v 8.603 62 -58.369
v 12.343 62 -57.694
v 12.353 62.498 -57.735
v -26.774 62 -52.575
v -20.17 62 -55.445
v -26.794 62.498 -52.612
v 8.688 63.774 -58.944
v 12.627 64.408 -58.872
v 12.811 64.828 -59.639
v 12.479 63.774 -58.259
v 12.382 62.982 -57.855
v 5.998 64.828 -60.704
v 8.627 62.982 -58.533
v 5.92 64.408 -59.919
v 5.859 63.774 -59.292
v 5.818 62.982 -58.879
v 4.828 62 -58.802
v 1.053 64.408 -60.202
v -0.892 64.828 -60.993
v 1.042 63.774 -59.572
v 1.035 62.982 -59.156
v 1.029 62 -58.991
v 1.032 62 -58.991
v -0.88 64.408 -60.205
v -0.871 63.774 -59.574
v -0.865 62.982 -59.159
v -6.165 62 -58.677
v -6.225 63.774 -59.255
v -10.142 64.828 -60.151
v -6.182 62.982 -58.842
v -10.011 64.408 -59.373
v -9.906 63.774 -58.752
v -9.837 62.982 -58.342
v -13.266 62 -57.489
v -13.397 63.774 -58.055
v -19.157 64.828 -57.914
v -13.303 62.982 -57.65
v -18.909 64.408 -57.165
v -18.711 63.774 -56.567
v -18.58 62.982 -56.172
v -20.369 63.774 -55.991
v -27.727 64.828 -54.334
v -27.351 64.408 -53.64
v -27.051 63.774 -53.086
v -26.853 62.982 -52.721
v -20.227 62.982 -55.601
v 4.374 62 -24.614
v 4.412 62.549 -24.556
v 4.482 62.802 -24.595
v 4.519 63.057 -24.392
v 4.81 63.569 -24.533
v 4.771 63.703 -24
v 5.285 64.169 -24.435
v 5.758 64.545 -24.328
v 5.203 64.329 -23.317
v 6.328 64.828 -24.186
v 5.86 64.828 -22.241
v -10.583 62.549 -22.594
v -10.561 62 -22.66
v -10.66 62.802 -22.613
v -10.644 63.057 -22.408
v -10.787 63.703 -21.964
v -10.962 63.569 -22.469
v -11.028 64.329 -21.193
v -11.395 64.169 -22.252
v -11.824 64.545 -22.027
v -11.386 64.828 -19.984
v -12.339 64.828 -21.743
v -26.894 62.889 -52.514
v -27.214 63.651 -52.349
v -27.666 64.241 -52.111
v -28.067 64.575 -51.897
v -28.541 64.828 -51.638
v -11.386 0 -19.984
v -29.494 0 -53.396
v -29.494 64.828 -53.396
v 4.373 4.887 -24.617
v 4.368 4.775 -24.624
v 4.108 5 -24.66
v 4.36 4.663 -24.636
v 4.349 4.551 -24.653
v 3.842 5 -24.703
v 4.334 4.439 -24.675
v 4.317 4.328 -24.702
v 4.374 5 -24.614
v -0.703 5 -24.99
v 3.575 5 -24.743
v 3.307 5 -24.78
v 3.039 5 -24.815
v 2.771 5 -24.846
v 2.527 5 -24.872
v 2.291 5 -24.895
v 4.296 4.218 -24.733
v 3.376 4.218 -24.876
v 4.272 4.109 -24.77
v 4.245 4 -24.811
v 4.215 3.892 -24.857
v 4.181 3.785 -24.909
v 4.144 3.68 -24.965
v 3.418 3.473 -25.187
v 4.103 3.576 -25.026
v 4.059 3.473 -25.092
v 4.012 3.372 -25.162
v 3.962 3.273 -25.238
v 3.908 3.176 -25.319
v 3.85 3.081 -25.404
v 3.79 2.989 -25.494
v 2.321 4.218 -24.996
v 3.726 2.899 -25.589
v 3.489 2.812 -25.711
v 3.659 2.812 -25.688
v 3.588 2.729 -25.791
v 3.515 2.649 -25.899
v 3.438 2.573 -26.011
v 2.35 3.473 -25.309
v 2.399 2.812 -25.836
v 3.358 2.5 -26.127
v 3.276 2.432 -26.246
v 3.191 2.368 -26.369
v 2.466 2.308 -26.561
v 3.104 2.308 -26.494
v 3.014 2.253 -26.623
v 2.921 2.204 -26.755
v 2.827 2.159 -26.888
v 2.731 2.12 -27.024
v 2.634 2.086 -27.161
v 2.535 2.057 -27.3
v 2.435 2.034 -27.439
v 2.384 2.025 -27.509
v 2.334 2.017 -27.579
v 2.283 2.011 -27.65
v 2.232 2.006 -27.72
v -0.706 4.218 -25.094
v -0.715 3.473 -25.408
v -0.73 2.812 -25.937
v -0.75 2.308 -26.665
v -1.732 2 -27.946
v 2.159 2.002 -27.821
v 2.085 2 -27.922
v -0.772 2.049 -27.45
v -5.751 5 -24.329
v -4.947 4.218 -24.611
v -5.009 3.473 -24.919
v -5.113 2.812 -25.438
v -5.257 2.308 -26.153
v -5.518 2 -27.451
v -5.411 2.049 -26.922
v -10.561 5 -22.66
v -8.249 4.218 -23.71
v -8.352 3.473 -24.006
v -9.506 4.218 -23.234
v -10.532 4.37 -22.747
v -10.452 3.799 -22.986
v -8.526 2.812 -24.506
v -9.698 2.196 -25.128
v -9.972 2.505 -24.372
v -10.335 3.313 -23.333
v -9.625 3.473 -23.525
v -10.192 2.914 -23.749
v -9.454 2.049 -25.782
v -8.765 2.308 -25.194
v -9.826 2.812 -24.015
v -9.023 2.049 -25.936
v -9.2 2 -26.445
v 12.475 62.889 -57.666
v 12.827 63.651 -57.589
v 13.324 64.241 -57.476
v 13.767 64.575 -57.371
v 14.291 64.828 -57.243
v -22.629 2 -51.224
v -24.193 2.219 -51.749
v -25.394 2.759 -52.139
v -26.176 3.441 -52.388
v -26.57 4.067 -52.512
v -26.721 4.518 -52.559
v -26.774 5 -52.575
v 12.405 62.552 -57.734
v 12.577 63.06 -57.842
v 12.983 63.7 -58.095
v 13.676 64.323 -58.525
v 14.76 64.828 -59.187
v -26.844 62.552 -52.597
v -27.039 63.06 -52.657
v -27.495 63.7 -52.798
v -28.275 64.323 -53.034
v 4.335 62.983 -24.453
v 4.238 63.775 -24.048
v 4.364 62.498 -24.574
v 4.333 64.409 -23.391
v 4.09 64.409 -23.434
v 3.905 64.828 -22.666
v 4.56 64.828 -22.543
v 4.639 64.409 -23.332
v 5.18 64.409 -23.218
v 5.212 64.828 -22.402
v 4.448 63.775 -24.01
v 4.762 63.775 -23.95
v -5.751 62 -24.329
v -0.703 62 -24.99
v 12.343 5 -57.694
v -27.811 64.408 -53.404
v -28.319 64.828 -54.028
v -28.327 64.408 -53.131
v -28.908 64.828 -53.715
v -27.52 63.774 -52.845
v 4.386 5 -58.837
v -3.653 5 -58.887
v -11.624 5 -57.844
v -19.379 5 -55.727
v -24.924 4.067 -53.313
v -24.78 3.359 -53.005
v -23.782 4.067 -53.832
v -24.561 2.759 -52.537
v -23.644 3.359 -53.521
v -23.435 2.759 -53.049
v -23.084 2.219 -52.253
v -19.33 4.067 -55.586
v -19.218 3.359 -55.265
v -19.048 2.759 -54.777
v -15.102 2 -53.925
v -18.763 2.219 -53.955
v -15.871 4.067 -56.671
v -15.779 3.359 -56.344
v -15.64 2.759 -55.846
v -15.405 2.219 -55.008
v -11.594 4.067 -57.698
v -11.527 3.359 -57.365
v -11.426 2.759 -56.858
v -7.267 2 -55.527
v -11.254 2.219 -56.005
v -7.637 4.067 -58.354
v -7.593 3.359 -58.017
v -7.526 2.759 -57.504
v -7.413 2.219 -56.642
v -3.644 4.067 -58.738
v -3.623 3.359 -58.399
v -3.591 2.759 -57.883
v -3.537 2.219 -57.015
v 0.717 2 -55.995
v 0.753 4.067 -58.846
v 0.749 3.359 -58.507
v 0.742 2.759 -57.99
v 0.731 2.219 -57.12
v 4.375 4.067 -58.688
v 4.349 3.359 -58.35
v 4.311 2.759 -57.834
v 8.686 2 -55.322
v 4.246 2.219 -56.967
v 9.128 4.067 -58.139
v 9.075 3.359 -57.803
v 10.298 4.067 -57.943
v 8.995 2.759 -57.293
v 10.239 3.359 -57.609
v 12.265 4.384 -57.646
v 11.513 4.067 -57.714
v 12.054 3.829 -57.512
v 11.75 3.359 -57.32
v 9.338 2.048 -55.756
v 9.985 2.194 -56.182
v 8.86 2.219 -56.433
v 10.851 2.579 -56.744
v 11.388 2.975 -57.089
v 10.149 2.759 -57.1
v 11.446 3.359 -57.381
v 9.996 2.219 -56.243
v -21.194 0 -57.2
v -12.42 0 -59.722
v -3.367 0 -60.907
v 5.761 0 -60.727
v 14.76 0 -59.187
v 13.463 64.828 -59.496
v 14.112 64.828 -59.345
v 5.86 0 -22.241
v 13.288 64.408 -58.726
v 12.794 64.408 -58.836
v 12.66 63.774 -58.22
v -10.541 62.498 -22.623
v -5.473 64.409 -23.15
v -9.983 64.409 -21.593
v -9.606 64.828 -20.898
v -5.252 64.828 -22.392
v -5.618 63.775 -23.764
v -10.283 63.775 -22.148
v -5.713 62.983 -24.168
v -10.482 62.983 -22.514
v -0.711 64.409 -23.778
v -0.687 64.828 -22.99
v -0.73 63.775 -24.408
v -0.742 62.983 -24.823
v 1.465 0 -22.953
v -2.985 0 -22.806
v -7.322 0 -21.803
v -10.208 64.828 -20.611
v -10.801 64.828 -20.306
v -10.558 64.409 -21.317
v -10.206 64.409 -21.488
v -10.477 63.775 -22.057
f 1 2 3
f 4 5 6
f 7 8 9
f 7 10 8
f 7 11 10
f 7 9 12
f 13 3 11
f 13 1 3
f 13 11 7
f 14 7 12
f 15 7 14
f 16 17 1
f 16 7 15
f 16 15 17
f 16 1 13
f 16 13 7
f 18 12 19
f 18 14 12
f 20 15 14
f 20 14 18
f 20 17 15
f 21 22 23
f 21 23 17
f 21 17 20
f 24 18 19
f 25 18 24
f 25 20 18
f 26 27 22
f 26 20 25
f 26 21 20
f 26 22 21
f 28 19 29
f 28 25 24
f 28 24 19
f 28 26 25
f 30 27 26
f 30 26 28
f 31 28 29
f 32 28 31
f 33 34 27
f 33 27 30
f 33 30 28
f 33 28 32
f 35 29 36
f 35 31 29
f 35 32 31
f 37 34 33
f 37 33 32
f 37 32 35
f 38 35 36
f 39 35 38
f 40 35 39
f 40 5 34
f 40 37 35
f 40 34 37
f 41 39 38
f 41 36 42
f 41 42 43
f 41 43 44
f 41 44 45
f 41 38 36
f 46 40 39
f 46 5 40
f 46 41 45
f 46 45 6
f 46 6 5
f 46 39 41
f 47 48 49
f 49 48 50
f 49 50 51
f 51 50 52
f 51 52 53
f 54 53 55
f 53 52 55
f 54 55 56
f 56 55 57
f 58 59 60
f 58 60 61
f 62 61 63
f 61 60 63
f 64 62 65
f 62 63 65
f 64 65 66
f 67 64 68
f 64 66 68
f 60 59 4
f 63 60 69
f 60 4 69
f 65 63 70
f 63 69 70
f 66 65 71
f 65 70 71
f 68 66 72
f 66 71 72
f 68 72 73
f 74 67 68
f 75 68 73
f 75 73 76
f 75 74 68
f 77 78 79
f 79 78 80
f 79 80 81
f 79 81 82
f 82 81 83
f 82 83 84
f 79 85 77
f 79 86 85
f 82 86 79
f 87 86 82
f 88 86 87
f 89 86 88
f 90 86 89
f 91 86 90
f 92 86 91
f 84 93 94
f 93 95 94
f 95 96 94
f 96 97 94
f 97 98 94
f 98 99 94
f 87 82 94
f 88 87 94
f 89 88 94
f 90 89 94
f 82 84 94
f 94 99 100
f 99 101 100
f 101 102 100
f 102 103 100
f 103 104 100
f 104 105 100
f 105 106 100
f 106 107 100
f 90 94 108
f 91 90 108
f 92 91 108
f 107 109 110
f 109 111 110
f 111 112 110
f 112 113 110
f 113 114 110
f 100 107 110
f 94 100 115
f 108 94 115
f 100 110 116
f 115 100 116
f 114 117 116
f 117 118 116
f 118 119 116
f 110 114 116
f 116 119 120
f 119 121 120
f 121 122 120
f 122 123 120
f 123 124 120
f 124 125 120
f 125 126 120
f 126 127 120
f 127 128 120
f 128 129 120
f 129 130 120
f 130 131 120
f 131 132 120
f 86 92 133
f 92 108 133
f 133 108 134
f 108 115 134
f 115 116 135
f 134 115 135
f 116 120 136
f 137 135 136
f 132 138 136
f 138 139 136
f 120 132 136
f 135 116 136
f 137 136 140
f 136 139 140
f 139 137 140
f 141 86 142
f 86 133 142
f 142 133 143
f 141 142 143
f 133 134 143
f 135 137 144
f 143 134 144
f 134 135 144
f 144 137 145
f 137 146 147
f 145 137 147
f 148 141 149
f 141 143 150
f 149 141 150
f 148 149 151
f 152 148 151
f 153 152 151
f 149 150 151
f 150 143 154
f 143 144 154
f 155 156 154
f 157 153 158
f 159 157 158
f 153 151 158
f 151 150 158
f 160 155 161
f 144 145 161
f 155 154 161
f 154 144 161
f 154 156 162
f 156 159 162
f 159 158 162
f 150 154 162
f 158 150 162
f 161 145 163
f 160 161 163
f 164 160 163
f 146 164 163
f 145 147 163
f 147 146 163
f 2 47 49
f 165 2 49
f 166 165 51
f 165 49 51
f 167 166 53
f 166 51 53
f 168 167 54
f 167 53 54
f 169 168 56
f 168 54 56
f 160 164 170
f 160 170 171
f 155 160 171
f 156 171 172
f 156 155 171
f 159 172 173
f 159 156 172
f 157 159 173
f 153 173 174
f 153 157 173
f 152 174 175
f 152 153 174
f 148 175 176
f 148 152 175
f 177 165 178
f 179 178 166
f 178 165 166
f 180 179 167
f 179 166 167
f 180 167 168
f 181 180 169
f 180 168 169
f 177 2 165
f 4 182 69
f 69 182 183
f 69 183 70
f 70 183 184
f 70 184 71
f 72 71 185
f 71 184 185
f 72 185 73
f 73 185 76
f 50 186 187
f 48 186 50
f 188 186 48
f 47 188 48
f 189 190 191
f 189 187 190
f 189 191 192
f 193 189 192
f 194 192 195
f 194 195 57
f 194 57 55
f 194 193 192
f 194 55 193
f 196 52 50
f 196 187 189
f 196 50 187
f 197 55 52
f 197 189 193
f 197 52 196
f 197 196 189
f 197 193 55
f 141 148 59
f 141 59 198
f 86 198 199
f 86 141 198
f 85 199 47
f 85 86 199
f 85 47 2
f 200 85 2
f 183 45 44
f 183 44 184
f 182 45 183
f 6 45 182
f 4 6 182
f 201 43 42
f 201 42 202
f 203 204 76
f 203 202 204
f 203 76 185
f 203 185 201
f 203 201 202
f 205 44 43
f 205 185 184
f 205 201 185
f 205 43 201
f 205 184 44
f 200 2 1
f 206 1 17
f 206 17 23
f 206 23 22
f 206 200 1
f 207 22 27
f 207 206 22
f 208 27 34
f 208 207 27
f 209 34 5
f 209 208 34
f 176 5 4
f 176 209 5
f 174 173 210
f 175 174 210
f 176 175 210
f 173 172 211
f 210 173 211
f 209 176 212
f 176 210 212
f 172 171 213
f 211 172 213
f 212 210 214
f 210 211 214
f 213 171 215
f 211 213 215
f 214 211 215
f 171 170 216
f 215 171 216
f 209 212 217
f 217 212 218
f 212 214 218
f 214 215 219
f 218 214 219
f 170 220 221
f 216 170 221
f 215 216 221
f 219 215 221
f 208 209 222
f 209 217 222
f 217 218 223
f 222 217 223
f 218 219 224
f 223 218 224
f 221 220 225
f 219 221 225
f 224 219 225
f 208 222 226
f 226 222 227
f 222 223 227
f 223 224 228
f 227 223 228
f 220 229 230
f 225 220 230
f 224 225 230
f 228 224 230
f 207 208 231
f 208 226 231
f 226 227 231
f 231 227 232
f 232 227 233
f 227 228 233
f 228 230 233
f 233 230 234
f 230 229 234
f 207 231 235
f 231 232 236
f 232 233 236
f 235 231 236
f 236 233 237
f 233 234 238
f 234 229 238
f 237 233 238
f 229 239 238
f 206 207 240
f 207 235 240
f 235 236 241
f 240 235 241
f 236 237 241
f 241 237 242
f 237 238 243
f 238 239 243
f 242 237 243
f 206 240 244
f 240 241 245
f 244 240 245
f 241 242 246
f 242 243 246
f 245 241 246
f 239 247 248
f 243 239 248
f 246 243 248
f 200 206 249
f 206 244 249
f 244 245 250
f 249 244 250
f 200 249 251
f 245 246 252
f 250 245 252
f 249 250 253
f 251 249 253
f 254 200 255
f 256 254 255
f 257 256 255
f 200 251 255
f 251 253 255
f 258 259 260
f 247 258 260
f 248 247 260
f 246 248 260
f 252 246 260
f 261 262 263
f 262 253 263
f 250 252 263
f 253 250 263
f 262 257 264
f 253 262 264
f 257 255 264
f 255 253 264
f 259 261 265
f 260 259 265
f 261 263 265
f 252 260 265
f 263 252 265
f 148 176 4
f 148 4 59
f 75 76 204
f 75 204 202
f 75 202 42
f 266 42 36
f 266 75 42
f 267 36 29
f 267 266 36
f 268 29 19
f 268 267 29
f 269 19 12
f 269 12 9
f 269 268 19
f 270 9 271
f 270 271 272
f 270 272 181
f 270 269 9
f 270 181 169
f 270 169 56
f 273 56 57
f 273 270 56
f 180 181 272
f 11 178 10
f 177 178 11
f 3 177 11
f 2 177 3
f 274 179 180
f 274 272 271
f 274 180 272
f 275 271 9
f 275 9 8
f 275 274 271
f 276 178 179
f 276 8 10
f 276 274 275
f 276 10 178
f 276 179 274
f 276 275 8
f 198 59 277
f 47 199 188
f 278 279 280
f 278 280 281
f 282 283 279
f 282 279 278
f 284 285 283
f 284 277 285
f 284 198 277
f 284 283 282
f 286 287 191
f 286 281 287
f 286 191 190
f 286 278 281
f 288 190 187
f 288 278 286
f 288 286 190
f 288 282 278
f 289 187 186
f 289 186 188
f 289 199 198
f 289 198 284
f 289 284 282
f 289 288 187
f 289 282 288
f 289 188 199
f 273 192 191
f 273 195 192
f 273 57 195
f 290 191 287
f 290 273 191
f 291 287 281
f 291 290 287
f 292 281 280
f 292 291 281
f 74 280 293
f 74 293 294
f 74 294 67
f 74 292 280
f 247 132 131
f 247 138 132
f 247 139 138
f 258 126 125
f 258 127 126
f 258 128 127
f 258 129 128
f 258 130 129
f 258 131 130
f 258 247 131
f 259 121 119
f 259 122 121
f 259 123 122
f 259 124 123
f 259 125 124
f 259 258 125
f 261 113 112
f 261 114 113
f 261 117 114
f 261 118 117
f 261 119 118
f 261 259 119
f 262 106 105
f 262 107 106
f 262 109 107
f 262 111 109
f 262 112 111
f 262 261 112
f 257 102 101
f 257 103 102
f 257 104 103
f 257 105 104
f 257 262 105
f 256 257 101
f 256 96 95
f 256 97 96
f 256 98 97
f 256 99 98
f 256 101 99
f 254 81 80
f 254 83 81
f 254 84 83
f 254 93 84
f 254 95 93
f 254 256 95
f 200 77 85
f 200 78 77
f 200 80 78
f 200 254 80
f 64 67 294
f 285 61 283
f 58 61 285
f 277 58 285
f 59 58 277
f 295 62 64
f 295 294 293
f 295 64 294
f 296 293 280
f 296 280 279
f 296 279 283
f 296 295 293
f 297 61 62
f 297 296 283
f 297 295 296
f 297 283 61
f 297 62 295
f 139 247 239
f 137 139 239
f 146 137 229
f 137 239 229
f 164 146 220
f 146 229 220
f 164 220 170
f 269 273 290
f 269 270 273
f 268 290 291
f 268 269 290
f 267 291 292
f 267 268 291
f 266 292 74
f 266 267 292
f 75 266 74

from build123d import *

# Parameters (mm, degrees)
BOSS_EXTRUDE1_DEPTH = 2
BOSS_EXTRUDE2_DEPTH = 65
FILLET1_R           = 3


with BuildPart() as part:
    # Sketch1 → Boss-Extrude1 (new body)
    with BuildSketch(Plane(origin=(0, 0, 0), x_dir=(1, 0, 0), z_dir=(0, 1, 0))):
        with BuildLine():
            Line((-10.560958787, 22.659791471), (-26.773952234, 52.575236393))
            ThreePointArc((-26.773952234, 52.575236393), (-7.656070137, 58.501150331), (12.342908564, 57.69447641))
            Line((12.342908564, 57.69447641), (4.374170949, 24.614358178))
            ThreePointArc((4.374170949, 24.614358178), (-3.244097516, 24.788623022), (-10.560958787, 22.659791471))
        make_face()
    extrude(amount=BOSS_EXTRUDE1_DEPTH)

    # Sketch1<3> → Boss-Extrude2 (add)
    with BuildSketch(Plane(origin=(0, 0, 0), x_dir=(1, 0, 0), z_dir=(0, 1, 0))):
        with BuildLine():
            ThreePointArc((5.859670357, 22.24104906), (-2.984569714, 22.80553318), (-11.385698648, 19.984140369))
            Line((-11.385698648, 19.984140369), (-29.493588104, 53.395957344))
            ThreePointArc((-29.493588104, 53.395957344), (-7.915597938, 60.484240173), (14.75975536, 59.187411007))
            Line((14.75975536, 59.187411007), (5.859670357, 22.24104906))
        make_face()
        with BuildLine():
            Line((4.374170949, 24.614358178), (12.342908564, 57.69447641))
            ThreePointArc((12.342908564, 57.69447641), (-7.656070137, 58.501150331), (-26.773952234, 52.575236393))
            Line((-26.773952234, 52.575236393), (-10.560958787, 22.659791471))
            ThreePointArc((-10.560958787, 22.659791471), (-3.244097516, 24.788623022), (4.374170949, 24.614358178))
        make_face(mode=Mode.SUBTRACT)
    extrude(amount=BOSS_EXTRUDE2_DEPTH)

    # Fillet1
    # the kernel refuses this fillet: 3 mm, written as the material it adds along each edge
    with BuildSketch(Plane(origin=(-6.987336603, 2, -16.065913667), x_dir=(0, 1, 0), z_dir=(-0.4764829578611926, 0, -0.879183707121469))) as fillet1_piece_1_section:
        with BuildLine():
            CenterArc((FILLET1_R, FILLET1_R), FILLET1_R, 180, 90)
            Line((0, FILLET1_R), (0, 0))
            Line((0, 0), (FILLET1_R, 0))
        make_face()
    fillet1_piece_1 = extrude(amount=49.02638684, mode=Mode.PRIVATE)
    fillet1_piece_1 = fillet1_piece_1 & Plane(origin=(0, 2, 0), x_dir=(0.20920184006511774, 0, -0.977872481519635), z_dir=(0, -1, 0)) * Cylinder(59, 111, mode=Mode.PRIVATE)
    fillet1_piece_1 = fillet1_piece_1 - Plane(origin=(0, 2, 0), x_dir=(-0.4224383514814905, 0, -0.9063916588305525), z_dir=(0, -1, 0)) * Cylinder(25, 111, mode=Mode.PRIVATE)
    add(fillet1_piece_1)
    with BuildSketch(Plane(origin=(0, 2, 0), x_dir=(0.4581300705855368, 0, -0.8888851660508748), z_dir=(0.8888851660508748, 0, 0.4581300705855368))) as fillet1_piece_2_section:
        with BuildLine():
            CenterArc((25 + FILLET1_R, FILLET1_R), FILLET1_R, 180, 90)
            Line((25 + FILLET1_R, 0), (25, 0))
            Line((25, 0), (25, FILLET1_R))
        make_face()
    fillet1_piece_2 = revolve(axis=Axis((0, 2, 0), (0, 1, 0)), revolution_arc=69.444918607, mode=Mode.PRIVATE)
    fillet1_piece_2 = split(fillet1_piece_2, bisect_by=Plane(origin=(-1.469933591, 2, -0.354095322), z_dir=(-0.9721901531046743, 0, -0.23419288248431033)), keep=Keep.TOP, mode=Mode.PRIVATE)
    fillet1_piece_2 = split(fillet1_piece_2, bisect_by=Plane(origin=(1.329309559, 2, -0.720433449), z_dir=(0.879183707121469, 0, -0.4764829578611926)), keep=Keep.TOP, mode=Mode.PRIVATE)
    add(fillet1_piece_2)
    with BuildSketch(Plane(origin=(14.099355182, 2, -64.985902558), x_dir=(0, 1, 0), z_dir=(-0.23419288248431033, 0, 0.9721901531046743))) as fillet1_piece_3_section:
        with BuildLine():
            CenterArc((FILLET1_R, FILLET1_R), FILLET1_R, 180, 90)
            Line((0, FILLET1_R), (0, 0))
            Line((0, 0), (FILLET1_R, 0))
        make_face()
    fillet1_piece_3 = extrude(amount=49.02638684, mode=Mode.PRIVATE)
    fillet1_piece_3 = fillet1_piece_3 & Plane(origin=(0, 2, 0), x_dir=(0.20920184006511774, 0, -0.977872481519635), z_dir=(0, -1, 0)) * Cylinder(59, 111, mode=Mode.PRIVATE)
    fillet1_piece_3 = fillet1_piece_3 - Plane(origin=(0, 2, 0), x_dir=(-0.4224383514814905, 0, -0.9063916588305525), z_dir=(0, -1, 0)) * Cylinder(25, 111, mode=Mode.PRIVATE)
    add(fillet1_piece_3)
    with BuildSketch(Plane(origin=(0, 2, 0), x_dir=(-0.5631135264188442, 0, -0.8263795474018787), z_dir=(-0.8263795474018787, 0, 0.5631135264188442))) as fillet1_piece_4_section:
        with BuildLine():
            CenterArc((59 - FILLET1_R, -FILLET1_R), FILLET1_R, 0, 90)
            Line((59 - FILLET1_R, 0), (59, 0))
            Line((59, 0), (59, -FILLET1_R))
        make_face()
    fillet1_piece_4 = revolve(axis=Axis((0, 2, 0), (0, -1, 0)), revolution_arc=53.630888503, mode=Mode.PRIVATE)
    fillet1_piece_4 = split(fillet1_piece_4, bisect_by=Plane(origin=(-1.469933591, 2, -0.354095322), z_dir=(-0.9721901531046743, 0, -0.23419288248431033)), keep=Keep.TOP, mode=Mode.PRIVATE)
    fillet1_piece_4 = split(fillet1_piece_4, bisect_by=Plane(origin=(1.329309559, 2, -0.720433449), z_dir=(0.879183707121469, 0, -0.4764829578611926)), keep=Keep.TOP, mode=Mode.PRIVATE)
    add(fillet1_piece_4)
    # the kernel refuses this fillet: 3 mm, written as the material it takes off along each edge
    with BuildSketch(Plane(origin=(0, 65, 0), x_dir=(-0.6714413755332248, 0, -0.7410576760428644), z_dir=(-0.7410576760428644, 0, 0.6714413755332248))) as fillet1_2_piece_1_section:
        with BuildLine():
            CenterArc((25 - FILLET1_R, FILLET1_R), FILLET1_R, 270, 90)
            Line((25, FILLET1_R), (25, 0))
            Line((25, 0), (25 - FILLET1_R, 0))
        make_face()
    fillet1_2_piece_1 = revolve(axis=Axis((0, 65, 0), (0, -1, 0)), revolution_arc=69.444918607, mode=Mode.PRIVATE)
    fillet1_2_piece_1 = split(fillet1_2_piece_1, bisect_by=Plane(origin=(-1.469933591, 65, -0.354095322), z_dir=(-0.9721901531046743, 0, -0.23419288248431033)), keep=Keep.TOP, mode=Mode.PRIVATE)
    fillet1_2_piece_1 = split(fillet1_2_piece_1, bisect_by=Plane(origin=(1.329309559, 65, -0.720433449), z_dir=(0.879183707121469, 0, -0.4764829578611926)), keep=Keep.TOP, mode=Mode.PRIVATE)
    add(fillet1_2_piece_1, mode=Mode.SUBTRACT)
    with BuildSketch(Plane(origin=(-30.347574418, 65, -59.169114196), x_dir=(-0.879183707121469, 0, 0.47648295786119255), z_dir=(0.4764829578611926, 0, 0.879183707121469))) as fillet1_2_piece_2_section:
        with BuildLine():
            CenterArc((FILLET1_R, FILLET1_R), FILLET1_R, 180, 90)
            Line((0, FILLET1_R), (0, 0))
            Line((0, 0), (FILLET1_R, 0))
        make_face()
    fillet1_2_piece_2 = extrude(amount=49.02638684, mode=Mode.PRIVATE)
    fillet1_2_piece_2 = fillet1_2_piece_2 & Plane(origin=(0, 65, 0), x_dir=(0.20920184006511774, 0, -0.977872481519635), z_dir=(0, -1, 0)) * Cylinder(59, 111, mode=Mode.PRIVATE)
    fillet1_2_piece_2 = fillet1_2_piece_2 - Plane(origin=(0, 65, 0), x_dir=(-0.4224383514814905, 0, -0.9063916588305525), z_dir=(0, -1, 0)) * Cylinder(25, 111, mode=Mode.PRIVATE)
    add(fillet1_2_piece_2, mode=Mode.SUBTRACT)
    with BuildSketch(Plane(origin=(2.617724331, 65, -17.32293203), x_dir=(0.9721901531046743, 0, 0.23419288248431033), z_dir=(0.23419288248431033, 0, -0.9721901531046743))) as fillet1_2_piece_3_section:
        with BuildLine():
            CenterArc((FILLET1_R, FILLET1_R), FILLET1_R, 180, 90)
            Line((0, FILLET1_R), (0, 0))
            Line((0, 0), (FILLET1_R, 0))
        make_face()
    fillet1_2_piece_3 = extrude(amount=49.02638684, mode=Mode.PRIVATE)
    fillet1_2_piece_3 = fillet1_2_piece_3 & Plane(origin=(0, 65, 0), x_dir=(0.20920184006511774, 0, -0.977872481519635), z_dir=(0, -1, 0)) * Cylinder(59, 111, mode=Mode.PRIVATE)
    fillet1_2_piece_3 = fillet1_2_piece_3 - Plane(origin=(0, 65, 0), x_dir=(-0.4224383514814905, 0, -0.9063916588305525), z_dir=(0, -1, 0)) * Cylinder(25, 111, mode=Mode.PRIVATE)
    add(fillet1_2_piece_3, mode=Mode.SUBTRACT)
    with BuildSketch(Plane(origin=(0, 65, 0), x_dir=(0.33149424176414766, 0, -0.9434572421033254), z_dir=(0.9434572421033254, 0, 0.33149424176414766))) as fillet1_2_piece_4_section:
        with BuildLine():
            CenterArc((59 + FILLET1_R, -FILLET1_R), FILLET1_R, 90, 90)
            Line((59, -FILLET1_R), (59, 0))
            Line((59, 0), (59 + FILLET1_R, 0))
        make_face()
    fillet1_2_piece_4 = revolve(axis=Axis((0, 65, 0), (0, 1, 0)), revolution_arc=53.630888503, mode=Mode.PRIVATE)
    fillet1_2_piece_4 = split(fillet1_2_piece_4, bisect_by=Plane(origin=(-1.469933591, 65, -0.354095322), z_dir=(-0.9721901531046743, 0, -0.23419288248431033)), keep=Keep.TOP, mode=Mode.PRIVATE)
    fillet1_2_piece_4 = split(fillet1_2_piece_4, bisect_by=Plane(origin=(1.329309559, 65, -0.720433449), z_dir=(0.879183707121469, 0, -0.4764829578611926)), keep=Keep.TOP, mode=Mode.PRIVATE)
    add(fillet1_2_piece_4, mode=Mode.SUBTRACT)
    with BuildSketch(Plane(origin=(-30.347574418, 65, -59.169114196), x_dir=(-0.879183707121469, 0, 0.47648295786119255), z_dir=(0.4764829578611926, 0, 0.879183707121469))) as fillet1_2_piece_5a_section:
        with BuildLine():
            CenterArc((FILLET1_R, FILLET1_R), FILLET1_R, 180, 90)
            Line((0, FILLET1_R), (0, 0))
            Line((0, 0), (FILLET1_R, 0))
        make_face()
    fillet1_2_piece_5a = extrude(amount=49.02638684, mode=Mode.PRIVATE)
    fillet1_2_piece_5a = fillet1_2_piece_5a - Plane(origin=(0, 65, 0), x_dir=(0.25476827639356225, 0, -0.9670021330604465), z_dir=(0, -1, 0)) * Cylinder(23, 111, mode=Mode.PRIVATE)
    fillet1_2_piece_5a = split(fillet1_2_piece_5a, bisect_by=Plane(origin=(-32.105941832, 65, -58.216148281), z_dir=(0.8791837071214691, 0, -0.47648295786119255)), keep=Keep.TOP, mode=Mode.PRIVATE)
    fillet1_2_piece_5a = fillet1_2_piece_5a & Plane(origin=(0, 65, 0), x_dir=(-0.4224383514814905, 0, -0.9063916588305525), z_dir=(0, -1, 0)) * Cylinder(25, 111, mode=Mode.PRIVATE)
    with BuildSketch(Plane(origin=(0, 65, 0), x_dir=(-0.6714413755332248, 0, -0.7410576760428644), z_dir=(-0.7410576760428644, 0, 0.6714413755332248))) as fillet1_2_piece_5b_section:
        with BuildLine():
            CenterArc((25 - FILLET1_R, FILLET1_R), FILLET1_R, 270, 90)
            Line((25, FILLET1_R), (25, 0))
            Line((25, 0), (25 - FILLET1_R, 0))
        make_face()
    fillet1_2_piece_5b = revolve(axis=Axis((0, 65, 0), (0, -1, 0)), revolution_arc=69.444918607, mode=Mode.PRIVATE)
    fillet1_2_piece_5b = fillet1_2_piece_5b - Plane(origin=(0, 65, 0), x_dir=(0.25476827639356225, 0, -0.9670021330604465), z_dir=(0, -1, 0)) * Cylinder(23, 100, mode=Mode.PRIVATE)
    fillet1_2_piece_5b = split(fillet1_2_piece_5b, bisect_by=Plane(origin=(-0.429057855, 65, 0.232532466), z_dir=(0.8791837071214691, 0, -0.47648295786119255)), keep=Keep.TOP, mode=Mode.PRIVATE)
    fillet1_2_piece_5b = split(fillet1_2_piece_5b, bisect_by=Plane(origin=(1.329309559, 65, -0.720433449), z_dir=(-0.879183707121469, 0, 0.4764829578611926)), keep=Keep.TOP, mode=Mode.PRIVATE)
    fillet1_2_piece_5 = fillet1_2_piece_5a & fillet1_2_piece_5b
    add(fillet1_2_piece_5, mode=Mode.SUBTRACT)
    with BuildSketch(Plane(origin=(2.617724331, 65, -17.32293203), x_dir=(0.9721901531046743, 0, 0.23419288248431033), z_dir=(0.23419288248431033, 0, -0.9721901531046743))) as fillet1_2_piece_6a_section:
        with BuildLine():
            CenterArc((FILLET1_R, FILLET1_R), FILLET1_R, 180, 90)
            Line((0, FILLET1_R), (0, 0))
            Line((0, 0), (FILLET1_R, 0))
        make_face()
    fillet1_2_piece_6a = extrude(amount=49.02638684, mode=Mode.PRIVATE)
    fillet1_2_piece_6a = split(fillet1_2_piece_6a, bisect_by=Plane(origin=(4.562104637, 65, -16.854546265), z_dir=(-0.9721901531046744, 0, -0.23419288248431033)), keep=Keep.TOP, mode=Mode.PRIVATE)
    fillet1_2_piece_6a = fillet1_2_piece_6a - Plane(origin=(0, 65, 0), x_dir=(0.25476827639356225, 0, -0.9670021330604465), z_dir=(0, -1, 0)) * Cylinder(23, 111, mode=Mode.PRIVATE)
    fillet1_2_piece_6a = fillet1_2_piece_6a & Plane(origin=(0, 65, 0), x_dir=(-0.4224383514814905, 0, -0.9063916588305525), z_dir=(0, -1, 0)) * Cylinder(25, 111, mode=Mode.PRIVATE)
    with BuildSketch(Plane(origin=(0, 65, 0), x_dir=(-0.6714413755332248, 0, -0.7410576760428644), z_dir=(-0.7410576760428644, 0, 0.6714413755332248))) as fillet1_2_piece_6b_section:
        with BuildLine():
            CenterArc((25 - FILLET1_R, FILLET1_R), FILLET1_R, 270, 90)
            Line((25, FILLET1_R), (25, 0))
            Line((25, 0), (25 - FILLET1_R, 0))
        make_face()
    fillet1_2_piece_6b = revolve(axis=Axis((0, 65, 0), (0, -1, 0)), revolution_arc=69.444918607, mode=Mode.PRIVATE)
    fillet1_2_piece_6b = split(fillet1_2_piece_6b, bisect_by=Plane(origin=(0.474446715, 65, 0.114290443), z_dir=(-0.9721901531046744, 0, -0.23419288248431033)), keep=Keep.TOP, mode=Mode.PRIVATE)
    fillet1_2_piece_6b = fillet1_2_piece_6b - Plane(origin=(0, 65, 0), x_dir=(0.25476827639356225, 0, -0.9670021330604465), z_dir=(0, -1, 0)) * Cylinder(23, 100, mode=Mode.PRIVATE)
    fillet1_2_piece_6b = split(fillet1_2_piece_6b, bisect_by=Plane(origin=(-1.469933591, 65, -0.354095322), z_dir=(0.9721901531046743, 0, 0.23419288248431033)), keep=Keep.TOP, mode=Mode.PRIVATE)
    fillet1_2_piece_6 = fillet1_2_piece_6a & fillet1_2_piece_6b
    add(fillet1_2_piece_6, mode=Mode.SUBTRACT)
    with BuildSketch(Plane(origin=(0, 65, 0), x_dir=(0.33149424176414766, 0, -0.9434572421033254), z_dir=(0.9434572421033254, 0, 0.33149424176414766))) as fillet1_2_piece_7a_section:
        with BuildLine():
            CenterArc((59 + FILLET1_R, -FILLET1_R), FILLET1_R, 90, 90)
            Line((59, -FILLET1_R), (59, 0))
            Line((59, 0), (59 + FILLET1_R, 0))
        make_face()
    fillet1_2_piece_7a = revolve(axis=Axis((0, 65, 0), (0, 1, 0)), revolution_arc=53.630888503, mode=Mode.PRIVATE)
    fillet1_2_piece_7a = fillet1_2_piece_7a & Plane(origin=(0, 65, 0), x_dir=(-0.4835014443344291, 0, -0.8753435630234113), z_dir=(0, -1, 0)) * Cylinder(61, 248, mode=Mode.PRIVATE)
    fillet1_2_piece_7a = split(fillet1_2_piece_7a, bisect_by=Plane(origin=(-0.429057855, 65, 0.232532466), z_dir=(0.8791837071214691, 0, -0.47648295786119255)), keep=Keep.TOP, mode=Mode.PRIVATE)
    fillet1_2_piece_7a = split(fillet1_2_piece_7a, bisect_by=Plane(origin=(1.329309559, 65, -0.720433449), z_dir=(-0.879183707121469, 0, 0.4764829578611926)), keep=Keep.TOP, mode=Mode.PRIVATE)
    with BuildSketch(Plane(origin=(-30.347574418, 65, -59.169114196), x_dir=(-0.879183707121469, 0, 0.47648295786119255), z_dir=(0.4764829578611926, 0, 0.879183707121469))) as fillet1_2_piece_7b_section:
        with BuildLine():
            CenterArc((FILLET1_R, FILLET1_R), FILLET1_R, 180, 90)
            Line((0, FILLET1_R), (0, 0))
            Line((0, 0), (FILLET1_R, 0))
        make_face()
    fillet1_2_piece_7b = extrude(amount=49.02638684, mode=Mode.PRIVATE)
    fillet1_2_piece_7b = fillet1_2_piece_7b & Plane(origin=(0, 65, 0), x_dir=(-0.4835014443344291, 0, -0.8753435630234113), z_dir=(0, -1, 0)) * Cylinder(61, 111, mode=Mode.PRIVATE)
    fillet1_2_piece_7b = split(fillet1_2_piece_7b, bisect_by=Plane(origin=(-32.105941832, 65, -58.216148281), z_dir=(0.8791837071214691, 0, -0.47648295786119255)), keep=Keep.TOP, mode=Mode.PRIVATE)
    fillet1_2_piece_7b = fillet1_2_piece_7b - Plane(origin=(0, 65, 0), x_dir=(0.20920184006511774, 0, -0.977872481519635), z_dir=(0, -1, 0)) * Cylinder(59, 111, mode=Mode.PRIVATE)
    fillet1_2_piece_7 = fillet1_2_piece_7a & fillet1_2_piece_7b
    add(fillet1_2_piece_7, mode=Mode.SUBTRACT)
    with BuildSketch(Plane(origin=(2.617724331, 65, -17.32293203), x_dir=(0.9721901531046743, 0, 0.23419288248431033), z_dir=(0.23419288248431033, 0, -0.9721901531046743))) as fillet1_2_piece_8a_section:
        with BuildLine():
            CenterArc((FILLET1_R, FILLET1_R), FILLET1_R, 180, 90)
            Line((0, FILLET1_R), (0, 0))
            Line((0, 0), (FILLET1_R, 0))
        make_face()
    fillet1_2_piece_8a = extrude(amount=49.02638684, mode=Mode.PRIVATE)
    fillet1_2_piece_8a = fillet1_2_piece_8a & Plane(origin=(0, 65, 0), x_dir=(-0.4835014443344291, 0, -0.8753435630234113), z_dir=(0, -1, 0)) * Cylinder(61, 111, mode=Mode.PRIVATE)
    fillet1_2_piece_8a = split(fillet1_2_piece_8a, bisect_by=Plane(origin=(4.562104637, 65, -16.854546265), z_dir=(-0.9721901531046744, 0, -0.23419288248431033)), keep=Keep.TOP, mode=Mode.PRIVATE)
    fillet1_2_piece_8a = fillet1_2_piece_8a - Plane(origin=(0, 65, 0), x_dir=(0.20920184006511774, 0, -0.977872481519635), z_dir=(0, -1, 0)) * Cylinder(59, 111, mode=Mode.PRIVATE)
    with BuildSketch(Plane(origin=(0, 65, 0), x_dir=(0.33149424176414766, 0, -0.9434572421033254), z_dir=(0.9434572421033254, 0, 0.33149424176414766))) as fillet1_2_piece_8b_section:
        with BuildLine():
            CenterArc((59 + FILLET1_R, -FILLET1_R), FILLET1_R, 90, 90)
            Line((59, -FILLET1_R), (59, 0))
            Line((59, 0), (59 + FILLET1_R, 0))
        make_face()
    fillet1_2_piece_8b = revolve(axis=Axis((0, 65, 0), (0, 1, 0)), revolution_arc=53.630888503, mode=Mode.PRIVATE)
    fillet1_2_piece_8b = fillet1_2_piece_8b & Plane(origin=(0, 65, 0), x_dir=(-0.4835014443344291, 0, -0.8753435630234113), z_dir=(0, -1, 0)) * Cylinder(61, 248, mode=Mode.PRIVATE)
    fillet1_2_piece_8b = split(fillet1_2_piece_8b, bisect_by=Plane(origin=(0.474446715, 65, 0.114290443), z_dir=(-0.9721901531046744, 0, -0.23419288248431033)), keep=Keep.TOP, mode=Mode.PRIVATE)
    fillet1_2_piece_8b = split(fillet1_2_piece_8b, bisect_by=Plane(origin=(-1.469933591, 65, -0.354095322), z_dir=(0.9721901531046743, 0, 0.23419288248431033)), keep=Keep.TOP, mode=Mode.PRIVATE)
    fillet1_2_piece_8 = fillet1_2_piece_8a & fillet1_2_piece_8b
    add(fillet1_2_piece_8, mode=Mode.SUBTRACT)


solid = part.part
